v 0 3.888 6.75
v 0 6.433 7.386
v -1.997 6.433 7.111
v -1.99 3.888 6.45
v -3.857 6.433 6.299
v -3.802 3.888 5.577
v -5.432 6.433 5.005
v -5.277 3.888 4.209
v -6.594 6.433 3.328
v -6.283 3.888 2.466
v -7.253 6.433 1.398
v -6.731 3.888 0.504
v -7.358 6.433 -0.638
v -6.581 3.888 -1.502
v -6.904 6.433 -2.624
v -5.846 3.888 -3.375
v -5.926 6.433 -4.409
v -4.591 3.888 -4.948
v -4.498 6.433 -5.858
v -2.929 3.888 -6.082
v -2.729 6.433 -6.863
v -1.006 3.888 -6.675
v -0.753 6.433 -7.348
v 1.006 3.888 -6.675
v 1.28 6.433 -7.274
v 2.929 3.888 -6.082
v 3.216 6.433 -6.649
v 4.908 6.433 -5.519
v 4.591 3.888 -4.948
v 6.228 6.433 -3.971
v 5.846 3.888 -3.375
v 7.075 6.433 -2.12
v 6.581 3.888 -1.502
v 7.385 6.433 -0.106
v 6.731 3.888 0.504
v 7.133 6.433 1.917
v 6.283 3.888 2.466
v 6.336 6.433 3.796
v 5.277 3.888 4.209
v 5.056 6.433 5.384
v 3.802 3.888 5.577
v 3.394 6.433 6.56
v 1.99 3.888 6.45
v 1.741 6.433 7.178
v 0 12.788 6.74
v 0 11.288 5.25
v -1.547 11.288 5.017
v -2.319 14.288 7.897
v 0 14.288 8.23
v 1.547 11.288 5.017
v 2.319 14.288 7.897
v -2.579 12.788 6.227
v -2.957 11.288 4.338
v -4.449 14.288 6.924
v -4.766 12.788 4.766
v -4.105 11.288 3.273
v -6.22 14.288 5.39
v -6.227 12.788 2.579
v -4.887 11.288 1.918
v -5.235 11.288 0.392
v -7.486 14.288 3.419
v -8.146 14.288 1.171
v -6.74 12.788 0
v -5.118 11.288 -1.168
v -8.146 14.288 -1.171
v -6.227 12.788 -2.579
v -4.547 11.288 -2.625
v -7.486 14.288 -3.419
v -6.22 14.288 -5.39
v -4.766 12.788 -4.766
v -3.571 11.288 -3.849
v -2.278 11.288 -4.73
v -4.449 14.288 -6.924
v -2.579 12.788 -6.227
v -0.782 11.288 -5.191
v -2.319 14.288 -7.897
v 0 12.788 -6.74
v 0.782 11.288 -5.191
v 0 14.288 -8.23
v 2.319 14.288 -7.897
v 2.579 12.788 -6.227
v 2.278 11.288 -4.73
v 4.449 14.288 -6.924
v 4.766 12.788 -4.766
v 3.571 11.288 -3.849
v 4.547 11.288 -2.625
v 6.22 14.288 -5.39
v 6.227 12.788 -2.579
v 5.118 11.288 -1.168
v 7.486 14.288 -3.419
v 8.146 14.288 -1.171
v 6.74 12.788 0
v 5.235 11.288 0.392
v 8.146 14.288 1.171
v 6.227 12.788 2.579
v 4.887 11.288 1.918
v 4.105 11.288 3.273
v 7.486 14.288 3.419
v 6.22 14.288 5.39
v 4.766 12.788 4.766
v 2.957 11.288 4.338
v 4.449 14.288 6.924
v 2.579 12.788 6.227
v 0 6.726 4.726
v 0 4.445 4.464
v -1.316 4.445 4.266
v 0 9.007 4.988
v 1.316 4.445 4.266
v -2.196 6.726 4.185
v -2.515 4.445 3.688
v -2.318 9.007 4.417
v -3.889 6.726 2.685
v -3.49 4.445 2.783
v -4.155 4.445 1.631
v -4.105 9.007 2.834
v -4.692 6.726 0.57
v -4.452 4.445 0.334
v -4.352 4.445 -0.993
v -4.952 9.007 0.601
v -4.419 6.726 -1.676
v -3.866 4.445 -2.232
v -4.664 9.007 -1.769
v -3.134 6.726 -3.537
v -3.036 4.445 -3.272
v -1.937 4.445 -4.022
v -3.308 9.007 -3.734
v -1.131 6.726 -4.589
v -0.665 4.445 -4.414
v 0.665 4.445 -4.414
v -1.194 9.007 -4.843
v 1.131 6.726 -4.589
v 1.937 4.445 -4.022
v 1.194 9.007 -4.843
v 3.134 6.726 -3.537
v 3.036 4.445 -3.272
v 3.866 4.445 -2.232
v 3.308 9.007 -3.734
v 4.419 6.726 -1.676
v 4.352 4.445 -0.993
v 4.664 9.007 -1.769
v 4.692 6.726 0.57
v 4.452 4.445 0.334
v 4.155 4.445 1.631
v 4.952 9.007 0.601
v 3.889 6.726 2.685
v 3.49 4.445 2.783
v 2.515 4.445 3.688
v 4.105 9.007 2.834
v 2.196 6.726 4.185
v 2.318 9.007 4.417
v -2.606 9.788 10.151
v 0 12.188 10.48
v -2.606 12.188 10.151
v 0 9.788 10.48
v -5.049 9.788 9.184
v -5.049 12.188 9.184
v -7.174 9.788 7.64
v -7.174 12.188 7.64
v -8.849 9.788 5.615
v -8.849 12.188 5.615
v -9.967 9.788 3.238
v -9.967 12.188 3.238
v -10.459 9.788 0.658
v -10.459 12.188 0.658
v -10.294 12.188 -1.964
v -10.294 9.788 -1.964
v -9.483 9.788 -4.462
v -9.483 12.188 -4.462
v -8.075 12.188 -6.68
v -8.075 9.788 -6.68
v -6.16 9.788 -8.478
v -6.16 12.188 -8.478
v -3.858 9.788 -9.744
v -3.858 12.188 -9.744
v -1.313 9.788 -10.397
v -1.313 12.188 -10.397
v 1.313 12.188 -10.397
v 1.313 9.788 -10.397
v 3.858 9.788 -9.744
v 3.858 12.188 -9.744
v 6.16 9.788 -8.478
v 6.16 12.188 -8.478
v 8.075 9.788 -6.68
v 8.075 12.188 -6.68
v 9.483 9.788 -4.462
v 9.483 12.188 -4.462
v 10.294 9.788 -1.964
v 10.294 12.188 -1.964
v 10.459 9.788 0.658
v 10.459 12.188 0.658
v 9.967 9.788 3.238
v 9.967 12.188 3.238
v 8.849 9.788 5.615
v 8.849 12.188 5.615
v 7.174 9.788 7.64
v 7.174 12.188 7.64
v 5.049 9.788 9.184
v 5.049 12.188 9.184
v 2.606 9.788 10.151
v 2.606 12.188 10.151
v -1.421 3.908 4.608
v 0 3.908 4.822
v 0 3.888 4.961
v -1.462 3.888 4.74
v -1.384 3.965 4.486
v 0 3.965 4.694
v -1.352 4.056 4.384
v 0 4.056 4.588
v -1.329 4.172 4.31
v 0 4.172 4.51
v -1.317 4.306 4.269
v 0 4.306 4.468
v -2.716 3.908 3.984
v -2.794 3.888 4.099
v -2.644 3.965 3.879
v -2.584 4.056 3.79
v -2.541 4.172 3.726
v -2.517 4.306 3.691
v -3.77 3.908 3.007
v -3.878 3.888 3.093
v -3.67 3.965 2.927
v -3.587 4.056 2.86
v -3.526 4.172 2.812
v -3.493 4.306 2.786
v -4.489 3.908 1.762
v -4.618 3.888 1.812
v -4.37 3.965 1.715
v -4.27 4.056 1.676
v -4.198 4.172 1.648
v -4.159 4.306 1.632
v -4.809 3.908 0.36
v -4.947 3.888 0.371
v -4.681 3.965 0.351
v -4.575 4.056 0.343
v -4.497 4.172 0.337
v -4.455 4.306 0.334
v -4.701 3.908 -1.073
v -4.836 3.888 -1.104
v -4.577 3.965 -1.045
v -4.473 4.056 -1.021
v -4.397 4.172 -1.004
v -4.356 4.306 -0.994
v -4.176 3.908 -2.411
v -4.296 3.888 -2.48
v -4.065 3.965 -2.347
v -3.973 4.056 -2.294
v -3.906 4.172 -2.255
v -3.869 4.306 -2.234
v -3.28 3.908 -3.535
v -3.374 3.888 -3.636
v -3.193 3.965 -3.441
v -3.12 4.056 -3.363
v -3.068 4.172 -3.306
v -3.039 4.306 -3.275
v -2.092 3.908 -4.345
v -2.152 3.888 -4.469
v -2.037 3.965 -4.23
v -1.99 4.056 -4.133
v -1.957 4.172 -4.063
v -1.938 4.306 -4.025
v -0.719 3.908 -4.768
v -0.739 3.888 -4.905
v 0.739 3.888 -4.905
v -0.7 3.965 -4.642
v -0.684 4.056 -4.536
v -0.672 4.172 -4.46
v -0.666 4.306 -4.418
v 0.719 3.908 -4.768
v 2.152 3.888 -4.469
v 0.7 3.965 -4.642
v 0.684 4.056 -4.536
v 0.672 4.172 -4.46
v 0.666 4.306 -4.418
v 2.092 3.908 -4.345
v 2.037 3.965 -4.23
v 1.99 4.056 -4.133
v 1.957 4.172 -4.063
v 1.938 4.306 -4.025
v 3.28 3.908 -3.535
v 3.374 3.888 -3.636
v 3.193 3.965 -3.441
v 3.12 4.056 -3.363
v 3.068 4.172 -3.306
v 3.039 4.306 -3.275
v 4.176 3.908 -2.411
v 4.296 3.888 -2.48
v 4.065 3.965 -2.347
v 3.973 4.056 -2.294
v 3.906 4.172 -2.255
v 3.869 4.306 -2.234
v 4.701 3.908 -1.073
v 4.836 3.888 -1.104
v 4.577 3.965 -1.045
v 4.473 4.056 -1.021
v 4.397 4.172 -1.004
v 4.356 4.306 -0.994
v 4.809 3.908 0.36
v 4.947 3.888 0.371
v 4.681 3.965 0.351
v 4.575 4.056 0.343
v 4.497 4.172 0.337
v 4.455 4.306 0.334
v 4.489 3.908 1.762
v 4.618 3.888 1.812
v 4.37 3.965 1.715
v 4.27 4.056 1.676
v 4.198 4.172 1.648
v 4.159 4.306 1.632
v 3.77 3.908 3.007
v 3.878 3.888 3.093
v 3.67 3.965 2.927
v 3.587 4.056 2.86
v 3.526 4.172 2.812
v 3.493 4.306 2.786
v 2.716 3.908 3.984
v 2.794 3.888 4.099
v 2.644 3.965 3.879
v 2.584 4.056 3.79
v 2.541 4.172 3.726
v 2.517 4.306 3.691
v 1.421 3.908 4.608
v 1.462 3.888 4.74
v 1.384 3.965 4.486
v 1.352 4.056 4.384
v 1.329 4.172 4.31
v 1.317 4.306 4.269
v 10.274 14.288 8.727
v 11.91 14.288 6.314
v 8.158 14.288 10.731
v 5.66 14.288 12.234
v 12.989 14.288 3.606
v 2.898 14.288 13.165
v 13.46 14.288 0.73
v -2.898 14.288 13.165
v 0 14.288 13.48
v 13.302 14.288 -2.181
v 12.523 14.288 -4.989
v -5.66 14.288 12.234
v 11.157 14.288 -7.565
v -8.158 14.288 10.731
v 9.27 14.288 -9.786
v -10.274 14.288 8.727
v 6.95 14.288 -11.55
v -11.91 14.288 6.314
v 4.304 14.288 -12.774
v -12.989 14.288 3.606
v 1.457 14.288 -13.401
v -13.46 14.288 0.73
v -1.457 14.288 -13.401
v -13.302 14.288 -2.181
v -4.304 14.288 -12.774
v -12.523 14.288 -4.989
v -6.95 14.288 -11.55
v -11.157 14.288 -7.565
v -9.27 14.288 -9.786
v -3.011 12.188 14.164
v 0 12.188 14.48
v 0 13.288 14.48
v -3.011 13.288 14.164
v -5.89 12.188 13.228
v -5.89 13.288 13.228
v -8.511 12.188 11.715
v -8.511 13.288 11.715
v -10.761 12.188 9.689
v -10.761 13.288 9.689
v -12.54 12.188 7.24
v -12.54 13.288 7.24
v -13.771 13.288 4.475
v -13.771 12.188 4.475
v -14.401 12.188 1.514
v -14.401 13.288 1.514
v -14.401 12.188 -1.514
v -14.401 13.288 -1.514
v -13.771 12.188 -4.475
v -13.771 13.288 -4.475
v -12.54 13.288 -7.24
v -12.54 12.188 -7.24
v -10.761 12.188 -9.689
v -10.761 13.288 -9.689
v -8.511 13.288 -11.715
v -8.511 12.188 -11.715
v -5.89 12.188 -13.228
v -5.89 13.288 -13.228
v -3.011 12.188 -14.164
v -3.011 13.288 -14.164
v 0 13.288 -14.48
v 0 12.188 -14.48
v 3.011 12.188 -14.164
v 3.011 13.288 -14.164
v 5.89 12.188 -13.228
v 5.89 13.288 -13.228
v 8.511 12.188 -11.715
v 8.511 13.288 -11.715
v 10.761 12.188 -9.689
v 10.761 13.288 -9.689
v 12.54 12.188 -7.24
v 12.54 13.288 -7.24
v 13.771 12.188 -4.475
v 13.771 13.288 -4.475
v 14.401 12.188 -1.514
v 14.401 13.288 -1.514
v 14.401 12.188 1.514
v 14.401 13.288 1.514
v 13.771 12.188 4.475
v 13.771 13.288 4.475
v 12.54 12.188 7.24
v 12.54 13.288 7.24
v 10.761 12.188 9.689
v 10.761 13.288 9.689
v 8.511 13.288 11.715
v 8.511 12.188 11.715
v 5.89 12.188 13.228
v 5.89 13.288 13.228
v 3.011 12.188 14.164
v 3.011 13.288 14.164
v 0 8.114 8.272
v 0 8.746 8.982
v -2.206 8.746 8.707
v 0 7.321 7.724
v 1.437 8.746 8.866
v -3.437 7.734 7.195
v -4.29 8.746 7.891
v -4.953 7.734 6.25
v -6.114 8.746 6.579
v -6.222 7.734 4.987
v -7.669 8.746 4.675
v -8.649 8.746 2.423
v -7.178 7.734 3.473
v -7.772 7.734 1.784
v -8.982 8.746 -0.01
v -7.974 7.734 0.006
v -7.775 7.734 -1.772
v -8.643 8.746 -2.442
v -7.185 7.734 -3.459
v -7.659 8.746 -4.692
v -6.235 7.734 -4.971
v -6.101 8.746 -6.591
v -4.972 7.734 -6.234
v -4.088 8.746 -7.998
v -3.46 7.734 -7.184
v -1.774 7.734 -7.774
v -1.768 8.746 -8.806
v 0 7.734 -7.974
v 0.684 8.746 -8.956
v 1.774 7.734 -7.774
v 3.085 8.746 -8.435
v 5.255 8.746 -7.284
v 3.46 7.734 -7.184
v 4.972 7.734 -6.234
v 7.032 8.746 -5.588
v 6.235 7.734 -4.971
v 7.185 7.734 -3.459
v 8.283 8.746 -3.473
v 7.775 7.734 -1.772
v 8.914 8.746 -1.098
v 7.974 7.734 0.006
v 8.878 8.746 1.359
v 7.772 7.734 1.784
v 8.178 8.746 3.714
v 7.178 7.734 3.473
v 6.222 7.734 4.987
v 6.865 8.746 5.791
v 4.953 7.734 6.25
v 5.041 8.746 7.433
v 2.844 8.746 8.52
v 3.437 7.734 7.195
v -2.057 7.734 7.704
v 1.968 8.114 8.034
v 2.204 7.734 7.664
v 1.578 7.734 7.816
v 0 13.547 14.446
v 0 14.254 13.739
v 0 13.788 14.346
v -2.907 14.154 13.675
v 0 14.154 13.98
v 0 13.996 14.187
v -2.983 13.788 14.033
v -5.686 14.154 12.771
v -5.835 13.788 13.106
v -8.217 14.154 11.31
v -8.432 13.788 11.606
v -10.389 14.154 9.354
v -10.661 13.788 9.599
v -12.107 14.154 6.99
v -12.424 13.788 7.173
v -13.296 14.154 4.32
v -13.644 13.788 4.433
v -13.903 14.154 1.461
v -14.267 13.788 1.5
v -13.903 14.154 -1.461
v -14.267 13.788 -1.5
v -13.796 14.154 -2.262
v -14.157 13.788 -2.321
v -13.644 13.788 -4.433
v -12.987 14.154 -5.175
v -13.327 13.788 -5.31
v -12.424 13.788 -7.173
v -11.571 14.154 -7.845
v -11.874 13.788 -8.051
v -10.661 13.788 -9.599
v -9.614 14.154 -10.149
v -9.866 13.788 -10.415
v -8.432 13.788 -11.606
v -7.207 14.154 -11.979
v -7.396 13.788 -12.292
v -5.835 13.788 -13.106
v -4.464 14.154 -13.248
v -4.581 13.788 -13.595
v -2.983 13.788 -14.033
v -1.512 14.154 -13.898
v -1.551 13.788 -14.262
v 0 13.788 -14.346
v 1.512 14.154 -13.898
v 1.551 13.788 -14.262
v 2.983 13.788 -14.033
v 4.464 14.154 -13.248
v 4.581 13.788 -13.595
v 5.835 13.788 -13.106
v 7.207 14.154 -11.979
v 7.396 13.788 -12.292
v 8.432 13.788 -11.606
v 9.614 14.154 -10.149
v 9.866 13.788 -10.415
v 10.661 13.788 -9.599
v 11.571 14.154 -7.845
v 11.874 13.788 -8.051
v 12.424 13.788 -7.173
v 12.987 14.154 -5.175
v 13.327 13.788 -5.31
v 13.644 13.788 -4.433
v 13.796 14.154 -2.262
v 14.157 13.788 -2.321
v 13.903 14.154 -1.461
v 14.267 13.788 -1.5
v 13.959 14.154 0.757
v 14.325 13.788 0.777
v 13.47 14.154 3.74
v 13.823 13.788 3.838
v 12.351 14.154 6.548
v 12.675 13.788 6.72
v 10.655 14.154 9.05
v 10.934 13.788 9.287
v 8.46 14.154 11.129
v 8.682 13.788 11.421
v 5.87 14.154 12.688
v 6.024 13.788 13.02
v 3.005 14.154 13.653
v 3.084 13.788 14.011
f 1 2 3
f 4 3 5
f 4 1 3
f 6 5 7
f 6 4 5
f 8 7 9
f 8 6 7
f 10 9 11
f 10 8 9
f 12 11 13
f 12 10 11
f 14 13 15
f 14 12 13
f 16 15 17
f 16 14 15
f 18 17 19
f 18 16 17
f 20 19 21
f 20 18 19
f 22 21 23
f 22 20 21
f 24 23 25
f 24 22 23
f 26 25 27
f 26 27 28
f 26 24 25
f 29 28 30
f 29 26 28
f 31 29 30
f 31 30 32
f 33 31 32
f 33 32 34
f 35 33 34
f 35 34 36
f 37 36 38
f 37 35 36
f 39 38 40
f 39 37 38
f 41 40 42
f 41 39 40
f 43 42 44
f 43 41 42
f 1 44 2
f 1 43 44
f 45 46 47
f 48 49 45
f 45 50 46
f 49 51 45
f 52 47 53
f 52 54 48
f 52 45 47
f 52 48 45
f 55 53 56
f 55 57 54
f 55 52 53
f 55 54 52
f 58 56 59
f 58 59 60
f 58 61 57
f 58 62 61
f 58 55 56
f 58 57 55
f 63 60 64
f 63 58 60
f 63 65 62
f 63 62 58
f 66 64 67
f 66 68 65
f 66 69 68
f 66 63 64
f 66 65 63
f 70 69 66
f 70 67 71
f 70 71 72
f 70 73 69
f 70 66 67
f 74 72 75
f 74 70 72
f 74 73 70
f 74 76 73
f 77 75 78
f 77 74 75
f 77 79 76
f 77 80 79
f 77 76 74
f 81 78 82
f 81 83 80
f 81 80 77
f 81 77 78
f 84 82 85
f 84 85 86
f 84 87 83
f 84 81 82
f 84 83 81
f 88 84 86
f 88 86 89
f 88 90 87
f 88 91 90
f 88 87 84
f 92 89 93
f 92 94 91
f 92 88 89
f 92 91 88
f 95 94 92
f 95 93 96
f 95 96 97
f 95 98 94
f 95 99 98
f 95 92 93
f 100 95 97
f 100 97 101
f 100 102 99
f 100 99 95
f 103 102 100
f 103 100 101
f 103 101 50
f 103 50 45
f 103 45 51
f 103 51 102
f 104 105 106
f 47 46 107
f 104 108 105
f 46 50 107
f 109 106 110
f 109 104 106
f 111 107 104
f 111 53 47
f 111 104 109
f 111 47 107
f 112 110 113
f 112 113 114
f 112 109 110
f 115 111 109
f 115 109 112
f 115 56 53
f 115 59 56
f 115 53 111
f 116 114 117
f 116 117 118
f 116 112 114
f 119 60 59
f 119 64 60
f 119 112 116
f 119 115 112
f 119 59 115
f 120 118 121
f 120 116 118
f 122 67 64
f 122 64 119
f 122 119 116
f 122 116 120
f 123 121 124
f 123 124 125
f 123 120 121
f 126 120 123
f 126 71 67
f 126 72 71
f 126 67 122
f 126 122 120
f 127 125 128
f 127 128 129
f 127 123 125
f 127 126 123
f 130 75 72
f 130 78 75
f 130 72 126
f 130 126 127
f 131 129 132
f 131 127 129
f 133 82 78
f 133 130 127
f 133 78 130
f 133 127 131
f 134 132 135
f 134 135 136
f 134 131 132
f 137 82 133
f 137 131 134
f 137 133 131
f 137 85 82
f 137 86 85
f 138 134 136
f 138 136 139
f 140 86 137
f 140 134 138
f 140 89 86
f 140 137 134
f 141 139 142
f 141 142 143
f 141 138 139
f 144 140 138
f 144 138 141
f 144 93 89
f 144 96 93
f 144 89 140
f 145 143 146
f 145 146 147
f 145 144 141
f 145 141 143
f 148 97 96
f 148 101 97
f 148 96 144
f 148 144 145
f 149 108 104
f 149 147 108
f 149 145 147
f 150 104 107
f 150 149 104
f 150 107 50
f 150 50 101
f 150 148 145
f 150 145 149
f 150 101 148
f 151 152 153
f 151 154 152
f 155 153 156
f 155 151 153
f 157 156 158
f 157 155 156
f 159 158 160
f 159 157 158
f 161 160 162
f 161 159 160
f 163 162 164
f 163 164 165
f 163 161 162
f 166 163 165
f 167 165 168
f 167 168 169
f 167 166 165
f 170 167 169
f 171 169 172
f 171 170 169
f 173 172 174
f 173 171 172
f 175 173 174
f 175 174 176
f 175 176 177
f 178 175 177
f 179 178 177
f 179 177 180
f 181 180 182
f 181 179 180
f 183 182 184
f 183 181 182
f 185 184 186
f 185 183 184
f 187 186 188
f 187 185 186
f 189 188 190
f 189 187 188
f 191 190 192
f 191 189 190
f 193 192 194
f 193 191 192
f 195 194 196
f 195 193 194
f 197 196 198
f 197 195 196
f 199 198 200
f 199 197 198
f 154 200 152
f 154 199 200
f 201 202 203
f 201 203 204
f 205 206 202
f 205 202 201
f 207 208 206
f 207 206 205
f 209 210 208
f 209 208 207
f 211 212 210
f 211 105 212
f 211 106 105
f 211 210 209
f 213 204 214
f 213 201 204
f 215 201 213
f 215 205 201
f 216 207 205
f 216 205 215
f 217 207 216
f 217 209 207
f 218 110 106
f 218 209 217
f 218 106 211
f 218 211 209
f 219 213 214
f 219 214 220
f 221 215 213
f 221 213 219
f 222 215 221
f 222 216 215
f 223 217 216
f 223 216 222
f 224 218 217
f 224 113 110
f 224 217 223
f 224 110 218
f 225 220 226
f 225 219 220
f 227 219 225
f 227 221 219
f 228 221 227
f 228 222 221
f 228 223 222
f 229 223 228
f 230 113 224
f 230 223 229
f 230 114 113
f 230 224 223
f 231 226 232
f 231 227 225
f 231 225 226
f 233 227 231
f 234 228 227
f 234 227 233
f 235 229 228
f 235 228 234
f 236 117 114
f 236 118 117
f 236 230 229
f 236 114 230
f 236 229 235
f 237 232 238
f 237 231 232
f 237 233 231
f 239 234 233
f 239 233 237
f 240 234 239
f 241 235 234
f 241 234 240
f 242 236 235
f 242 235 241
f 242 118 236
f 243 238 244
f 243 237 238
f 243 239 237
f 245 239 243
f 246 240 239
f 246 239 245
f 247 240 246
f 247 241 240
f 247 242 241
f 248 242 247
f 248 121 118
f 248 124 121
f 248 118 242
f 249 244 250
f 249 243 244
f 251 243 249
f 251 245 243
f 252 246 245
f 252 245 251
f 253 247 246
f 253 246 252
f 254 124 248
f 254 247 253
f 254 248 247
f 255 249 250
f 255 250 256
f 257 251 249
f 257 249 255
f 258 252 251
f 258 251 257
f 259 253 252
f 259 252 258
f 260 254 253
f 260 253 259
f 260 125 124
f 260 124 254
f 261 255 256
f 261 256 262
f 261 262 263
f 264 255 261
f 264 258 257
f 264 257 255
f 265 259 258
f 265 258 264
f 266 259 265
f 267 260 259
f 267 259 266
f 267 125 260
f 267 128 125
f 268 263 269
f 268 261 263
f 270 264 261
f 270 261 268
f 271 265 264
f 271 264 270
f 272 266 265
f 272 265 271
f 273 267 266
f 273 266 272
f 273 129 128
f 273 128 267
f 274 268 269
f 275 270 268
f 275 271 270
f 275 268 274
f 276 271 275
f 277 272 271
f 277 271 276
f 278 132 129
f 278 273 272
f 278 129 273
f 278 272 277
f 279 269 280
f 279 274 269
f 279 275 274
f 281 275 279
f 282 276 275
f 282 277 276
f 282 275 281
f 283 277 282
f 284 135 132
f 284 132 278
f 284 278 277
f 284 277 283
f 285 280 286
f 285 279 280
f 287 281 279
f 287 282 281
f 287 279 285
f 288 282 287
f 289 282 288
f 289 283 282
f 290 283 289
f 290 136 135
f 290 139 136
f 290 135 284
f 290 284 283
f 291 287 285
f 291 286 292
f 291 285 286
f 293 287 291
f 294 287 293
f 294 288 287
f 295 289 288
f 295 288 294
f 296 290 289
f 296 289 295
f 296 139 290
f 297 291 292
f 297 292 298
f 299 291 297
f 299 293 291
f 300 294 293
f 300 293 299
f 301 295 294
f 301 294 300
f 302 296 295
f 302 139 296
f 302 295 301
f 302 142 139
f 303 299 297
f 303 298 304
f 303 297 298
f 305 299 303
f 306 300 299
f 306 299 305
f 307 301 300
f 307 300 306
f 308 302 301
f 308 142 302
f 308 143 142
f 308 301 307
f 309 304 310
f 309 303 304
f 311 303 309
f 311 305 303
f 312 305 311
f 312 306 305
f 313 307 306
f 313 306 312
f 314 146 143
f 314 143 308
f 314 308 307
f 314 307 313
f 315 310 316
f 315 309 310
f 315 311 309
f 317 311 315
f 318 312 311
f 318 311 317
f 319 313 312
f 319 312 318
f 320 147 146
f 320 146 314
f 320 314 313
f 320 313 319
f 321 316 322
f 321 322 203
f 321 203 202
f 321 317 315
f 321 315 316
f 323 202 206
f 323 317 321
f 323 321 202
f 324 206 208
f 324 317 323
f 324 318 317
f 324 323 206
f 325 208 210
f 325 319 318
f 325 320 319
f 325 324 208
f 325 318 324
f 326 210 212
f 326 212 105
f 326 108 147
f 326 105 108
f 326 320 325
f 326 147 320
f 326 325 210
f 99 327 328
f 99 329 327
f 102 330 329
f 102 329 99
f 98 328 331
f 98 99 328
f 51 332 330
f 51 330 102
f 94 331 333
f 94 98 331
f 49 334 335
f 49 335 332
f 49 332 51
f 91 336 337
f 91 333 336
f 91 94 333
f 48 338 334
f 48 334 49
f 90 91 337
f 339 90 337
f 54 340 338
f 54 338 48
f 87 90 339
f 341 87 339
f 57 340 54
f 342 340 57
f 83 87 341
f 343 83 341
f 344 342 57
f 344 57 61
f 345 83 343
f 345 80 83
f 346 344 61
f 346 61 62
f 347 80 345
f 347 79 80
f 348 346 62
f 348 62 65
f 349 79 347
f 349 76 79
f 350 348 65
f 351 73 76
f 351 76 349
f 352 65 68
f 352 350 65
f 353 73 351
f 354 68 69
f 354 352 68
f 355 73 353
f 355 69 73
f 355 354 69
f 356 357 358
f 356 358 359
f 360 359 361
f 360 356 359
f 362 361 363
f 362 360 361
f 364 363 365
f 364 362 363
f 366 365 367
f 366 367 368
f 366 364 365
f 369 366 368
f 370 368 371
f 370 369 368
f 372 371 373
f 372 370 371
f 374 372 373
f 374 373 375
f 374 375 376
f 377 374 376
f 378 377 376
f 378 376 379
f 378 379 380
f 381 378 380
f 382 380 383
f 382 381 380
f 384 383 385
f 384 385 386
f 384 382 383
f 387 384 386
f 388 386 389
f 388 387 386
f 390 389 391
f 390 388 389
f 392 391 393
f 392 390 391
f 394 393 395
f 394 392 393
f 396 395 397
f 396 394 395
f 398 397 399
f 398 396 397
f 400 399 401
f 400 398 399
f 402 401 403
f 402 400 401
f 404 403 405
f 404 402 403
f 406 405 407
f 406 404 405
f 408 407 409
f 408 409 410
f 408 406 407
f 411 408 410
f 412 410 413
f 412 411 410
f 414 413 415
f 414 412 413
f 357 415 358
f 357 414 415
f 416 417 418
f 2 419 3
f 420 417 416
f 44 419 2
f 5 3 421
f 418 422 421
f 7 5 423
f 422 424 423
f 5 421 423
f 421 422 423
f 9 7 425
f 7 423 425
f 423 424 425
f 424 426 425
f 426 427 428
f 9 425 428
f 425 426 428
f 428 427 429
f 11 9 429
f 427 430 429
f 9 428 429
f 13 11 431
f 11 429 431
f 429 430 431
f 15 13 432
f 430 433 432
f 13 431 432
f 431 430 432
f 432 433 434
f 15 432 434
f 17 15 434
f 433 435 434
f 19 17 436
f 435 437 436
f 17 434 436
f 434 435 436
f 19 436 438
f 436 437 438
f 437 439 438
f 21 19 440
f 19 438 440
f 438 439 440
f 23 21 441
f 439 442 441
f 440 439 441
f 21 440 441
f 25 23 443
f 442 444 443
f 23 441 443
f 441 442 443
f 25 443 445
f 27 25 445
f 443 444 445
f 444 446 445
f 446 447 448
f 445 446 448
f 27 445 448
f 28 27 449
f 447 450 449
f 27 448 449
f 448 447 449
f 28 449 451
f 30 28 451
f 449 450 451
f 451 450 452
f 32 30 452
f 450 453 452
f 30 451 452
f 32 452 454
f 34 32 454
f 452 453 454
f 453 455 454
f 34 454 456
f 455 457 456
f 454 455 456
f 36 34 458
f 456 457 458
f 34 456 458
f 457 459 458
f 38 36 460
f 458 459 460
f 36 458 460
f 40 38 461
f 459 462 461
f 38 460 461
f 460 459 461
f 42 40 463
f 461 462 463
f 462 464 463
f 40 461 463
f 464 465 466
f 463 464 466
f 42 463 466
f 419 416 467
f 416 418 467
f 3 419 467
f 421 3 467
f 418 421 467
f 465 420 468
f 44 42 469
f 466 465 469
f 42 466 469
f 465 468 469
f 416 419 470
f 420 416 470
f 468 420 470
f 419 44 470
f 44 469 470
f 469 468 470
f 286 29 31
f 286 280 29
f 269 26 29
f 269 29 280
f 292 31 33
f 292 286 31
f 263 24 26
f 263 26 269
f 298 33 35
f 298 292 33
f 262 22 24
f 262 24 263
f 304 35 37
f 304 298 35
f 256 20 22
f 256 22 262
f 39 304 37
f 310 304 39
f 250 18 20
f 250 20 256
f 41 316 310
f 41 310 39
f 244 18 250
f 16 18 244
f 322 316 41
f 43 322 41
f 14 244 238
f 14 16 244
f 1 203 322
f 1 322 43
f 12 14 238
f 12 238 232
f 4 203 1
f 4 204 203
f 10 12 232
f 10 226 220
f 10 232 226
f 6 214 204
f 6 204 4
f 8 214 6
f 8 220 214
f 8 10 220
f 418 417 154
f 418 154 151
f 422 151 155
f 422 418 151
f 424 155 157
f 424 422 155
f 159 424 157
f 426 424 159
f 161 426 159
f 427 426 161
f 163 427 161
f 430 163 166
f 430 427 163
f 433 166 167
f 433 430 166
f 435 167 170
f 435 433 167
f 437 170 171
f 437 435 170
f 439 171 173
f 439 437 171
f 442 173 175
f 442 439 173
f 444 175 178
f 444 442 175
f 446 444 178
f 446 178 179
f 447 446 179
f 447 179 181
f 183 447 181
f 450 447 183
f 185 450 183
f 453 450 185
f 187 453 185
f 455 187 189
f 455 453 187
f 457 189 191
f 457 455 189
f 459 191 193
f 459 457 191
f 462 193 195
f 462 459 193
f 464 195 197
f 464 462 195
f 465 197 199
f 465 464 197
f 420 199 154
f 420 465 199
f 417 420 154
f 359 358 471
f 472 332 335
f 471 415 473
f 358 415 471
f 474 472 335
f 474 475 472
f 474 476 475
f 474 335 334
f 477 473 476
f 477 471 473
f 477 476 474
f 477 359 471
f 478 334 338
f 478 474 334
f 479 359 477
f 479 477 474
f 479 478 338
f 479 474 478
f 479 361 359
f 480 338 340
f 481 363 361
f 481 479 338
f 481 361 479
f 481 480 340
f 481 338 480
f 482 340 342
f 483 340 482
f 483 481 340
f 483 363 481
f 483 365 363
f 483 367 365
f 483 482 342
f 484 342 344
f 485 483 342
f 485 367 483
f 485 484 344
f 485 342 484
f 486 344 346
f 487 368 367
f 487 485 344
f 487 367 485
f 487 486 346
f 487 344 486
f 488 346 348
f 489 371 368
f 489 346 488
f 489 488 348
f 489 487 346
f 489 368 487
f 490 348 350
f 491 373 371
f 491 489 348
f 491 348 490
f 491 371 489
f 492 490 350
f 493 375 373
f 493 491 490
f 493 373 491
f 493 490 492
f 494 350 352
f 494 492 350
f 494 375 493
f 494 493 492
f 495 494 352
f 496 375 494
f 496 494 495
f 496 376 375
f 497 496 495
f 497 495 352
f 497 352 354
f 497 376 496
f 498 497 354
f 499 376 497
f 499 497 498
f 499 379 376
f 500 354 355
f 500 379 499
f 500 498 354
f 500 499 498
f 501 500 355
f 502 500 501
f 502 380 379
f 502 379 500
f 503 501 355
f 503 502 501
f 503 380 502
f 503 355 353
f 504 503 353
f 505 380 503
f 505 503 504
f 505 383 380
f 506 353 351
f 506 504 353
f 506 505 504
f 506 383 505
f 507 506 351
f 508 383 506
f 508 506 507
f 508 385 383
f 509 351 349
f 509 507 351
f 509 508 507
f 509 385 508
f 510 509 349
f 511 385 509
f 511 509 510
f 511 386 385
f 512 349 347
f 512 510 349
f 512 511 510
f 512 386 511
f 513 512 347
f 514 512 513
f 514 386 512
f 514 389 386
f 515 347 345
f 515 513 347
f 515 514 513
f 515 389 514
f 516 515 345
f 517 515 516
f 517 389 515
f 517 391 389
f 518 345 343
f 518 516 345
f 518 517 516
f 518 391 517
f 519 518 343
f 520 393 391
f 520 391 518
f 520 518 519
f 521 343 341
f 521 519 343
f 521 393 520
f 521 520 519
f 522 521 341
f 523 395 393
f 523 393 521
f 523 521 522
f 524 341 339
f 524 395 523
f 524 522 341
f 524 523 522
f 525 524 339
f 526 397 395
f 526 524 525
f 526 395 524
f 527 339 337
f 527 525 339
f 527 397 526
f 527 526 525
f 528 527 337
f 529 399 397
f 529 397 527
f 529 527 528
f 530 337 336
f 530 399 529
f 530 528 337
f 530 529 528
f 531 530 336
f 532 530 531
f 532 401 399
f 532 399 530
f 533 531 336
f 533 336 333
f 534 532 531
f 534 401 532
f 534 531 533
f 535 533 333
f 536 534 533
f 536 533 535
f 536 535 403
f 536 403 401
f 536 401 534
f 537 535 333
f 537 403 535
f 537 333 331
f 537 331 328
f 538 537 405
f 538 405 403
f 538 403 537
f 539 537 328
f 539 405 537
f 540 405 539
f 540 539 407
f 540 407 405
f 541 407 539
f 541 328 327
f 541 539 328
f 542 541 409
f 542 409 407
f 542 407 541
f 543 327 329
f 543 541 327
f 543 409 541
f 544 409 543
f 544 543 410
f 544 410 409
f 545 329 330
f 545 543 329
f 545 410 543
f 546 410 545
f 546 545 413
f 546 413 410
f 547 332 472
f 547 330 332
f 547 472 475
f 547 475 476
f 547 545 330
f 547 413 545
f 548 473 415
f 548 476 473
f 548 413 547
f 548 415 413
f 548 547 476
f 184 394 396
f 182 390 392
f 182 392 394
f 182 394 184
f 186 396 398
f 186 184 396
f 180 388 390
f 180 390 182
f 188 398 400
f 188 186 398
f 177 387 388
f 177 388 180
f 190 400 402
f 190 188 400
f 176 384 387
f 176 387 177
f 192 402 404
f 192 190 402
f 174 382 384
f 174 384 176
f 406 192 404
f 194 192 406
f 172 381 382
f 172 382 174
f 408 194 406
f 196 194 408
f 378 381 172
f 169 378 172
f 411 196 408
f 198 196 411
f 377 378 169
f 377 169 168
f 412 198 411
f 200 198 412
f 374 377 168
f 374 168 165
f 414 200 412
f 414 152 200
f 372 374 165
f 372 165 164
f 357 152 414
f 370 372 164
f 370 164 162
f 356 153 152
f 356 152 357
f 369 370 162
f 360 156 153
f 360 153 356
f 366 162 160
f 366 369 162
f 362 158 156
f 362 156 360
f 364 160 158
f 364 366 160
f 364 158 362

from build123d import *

# Parameters (mm, degrees)
CONG_1_R = 4
CONG_2_R = 0.5
CONG_4_R = 1


with BuildPart() as part:
    # Esquisse1 → Révolution1 (revolve)
    with BuildSketch(Plane.XY, mode=Mode.PRIVATE) as r_volution1_sk:
        Polygon((-8.23, 14.28840181), (-14.48, 14.28840181), (-14.48, 12.18840181), (-10.48, 12.18840181), (-10.48, 9.78840181), (-7.75, 7.88840181), (-6.75, 3.88840181), (-4.4, 3.88840181), (-5.25, 11.28840181), align=None)
    revolve(r_volution1_sk.sketch.rotate(Axis((0, 31.998542825, 0), (0, -1, 0)), 270), axis=Axis((0, 31.998542825, 0), (0, -1, 0)))  # turned: the seam where the file's is

    # Congé1
    cong_1_edges = [part.edges().sort_by_distance(p)[0] for p in [
        (0, 7.88840181, -7.75),
    ]]
    fillet(cong_1_edges, radius=CONG_1_R)

    # Congé2
    cong_2_edges = [part.edges().sort_by_distance(p)[0] for p in [
        (0, 3.88840181, -4.4),
    ]]
    fillet(cong_2_edges, radius=CONG_2_R)

    # Congé4
    cong_4_edges = [part.edges().sort_by_distance(p)[0] for p in [
        (0, 14.28840181, -14.48),
    ]]
    fillet(cong_4_edges, radius=CONG_4_R)


solid = part.part
